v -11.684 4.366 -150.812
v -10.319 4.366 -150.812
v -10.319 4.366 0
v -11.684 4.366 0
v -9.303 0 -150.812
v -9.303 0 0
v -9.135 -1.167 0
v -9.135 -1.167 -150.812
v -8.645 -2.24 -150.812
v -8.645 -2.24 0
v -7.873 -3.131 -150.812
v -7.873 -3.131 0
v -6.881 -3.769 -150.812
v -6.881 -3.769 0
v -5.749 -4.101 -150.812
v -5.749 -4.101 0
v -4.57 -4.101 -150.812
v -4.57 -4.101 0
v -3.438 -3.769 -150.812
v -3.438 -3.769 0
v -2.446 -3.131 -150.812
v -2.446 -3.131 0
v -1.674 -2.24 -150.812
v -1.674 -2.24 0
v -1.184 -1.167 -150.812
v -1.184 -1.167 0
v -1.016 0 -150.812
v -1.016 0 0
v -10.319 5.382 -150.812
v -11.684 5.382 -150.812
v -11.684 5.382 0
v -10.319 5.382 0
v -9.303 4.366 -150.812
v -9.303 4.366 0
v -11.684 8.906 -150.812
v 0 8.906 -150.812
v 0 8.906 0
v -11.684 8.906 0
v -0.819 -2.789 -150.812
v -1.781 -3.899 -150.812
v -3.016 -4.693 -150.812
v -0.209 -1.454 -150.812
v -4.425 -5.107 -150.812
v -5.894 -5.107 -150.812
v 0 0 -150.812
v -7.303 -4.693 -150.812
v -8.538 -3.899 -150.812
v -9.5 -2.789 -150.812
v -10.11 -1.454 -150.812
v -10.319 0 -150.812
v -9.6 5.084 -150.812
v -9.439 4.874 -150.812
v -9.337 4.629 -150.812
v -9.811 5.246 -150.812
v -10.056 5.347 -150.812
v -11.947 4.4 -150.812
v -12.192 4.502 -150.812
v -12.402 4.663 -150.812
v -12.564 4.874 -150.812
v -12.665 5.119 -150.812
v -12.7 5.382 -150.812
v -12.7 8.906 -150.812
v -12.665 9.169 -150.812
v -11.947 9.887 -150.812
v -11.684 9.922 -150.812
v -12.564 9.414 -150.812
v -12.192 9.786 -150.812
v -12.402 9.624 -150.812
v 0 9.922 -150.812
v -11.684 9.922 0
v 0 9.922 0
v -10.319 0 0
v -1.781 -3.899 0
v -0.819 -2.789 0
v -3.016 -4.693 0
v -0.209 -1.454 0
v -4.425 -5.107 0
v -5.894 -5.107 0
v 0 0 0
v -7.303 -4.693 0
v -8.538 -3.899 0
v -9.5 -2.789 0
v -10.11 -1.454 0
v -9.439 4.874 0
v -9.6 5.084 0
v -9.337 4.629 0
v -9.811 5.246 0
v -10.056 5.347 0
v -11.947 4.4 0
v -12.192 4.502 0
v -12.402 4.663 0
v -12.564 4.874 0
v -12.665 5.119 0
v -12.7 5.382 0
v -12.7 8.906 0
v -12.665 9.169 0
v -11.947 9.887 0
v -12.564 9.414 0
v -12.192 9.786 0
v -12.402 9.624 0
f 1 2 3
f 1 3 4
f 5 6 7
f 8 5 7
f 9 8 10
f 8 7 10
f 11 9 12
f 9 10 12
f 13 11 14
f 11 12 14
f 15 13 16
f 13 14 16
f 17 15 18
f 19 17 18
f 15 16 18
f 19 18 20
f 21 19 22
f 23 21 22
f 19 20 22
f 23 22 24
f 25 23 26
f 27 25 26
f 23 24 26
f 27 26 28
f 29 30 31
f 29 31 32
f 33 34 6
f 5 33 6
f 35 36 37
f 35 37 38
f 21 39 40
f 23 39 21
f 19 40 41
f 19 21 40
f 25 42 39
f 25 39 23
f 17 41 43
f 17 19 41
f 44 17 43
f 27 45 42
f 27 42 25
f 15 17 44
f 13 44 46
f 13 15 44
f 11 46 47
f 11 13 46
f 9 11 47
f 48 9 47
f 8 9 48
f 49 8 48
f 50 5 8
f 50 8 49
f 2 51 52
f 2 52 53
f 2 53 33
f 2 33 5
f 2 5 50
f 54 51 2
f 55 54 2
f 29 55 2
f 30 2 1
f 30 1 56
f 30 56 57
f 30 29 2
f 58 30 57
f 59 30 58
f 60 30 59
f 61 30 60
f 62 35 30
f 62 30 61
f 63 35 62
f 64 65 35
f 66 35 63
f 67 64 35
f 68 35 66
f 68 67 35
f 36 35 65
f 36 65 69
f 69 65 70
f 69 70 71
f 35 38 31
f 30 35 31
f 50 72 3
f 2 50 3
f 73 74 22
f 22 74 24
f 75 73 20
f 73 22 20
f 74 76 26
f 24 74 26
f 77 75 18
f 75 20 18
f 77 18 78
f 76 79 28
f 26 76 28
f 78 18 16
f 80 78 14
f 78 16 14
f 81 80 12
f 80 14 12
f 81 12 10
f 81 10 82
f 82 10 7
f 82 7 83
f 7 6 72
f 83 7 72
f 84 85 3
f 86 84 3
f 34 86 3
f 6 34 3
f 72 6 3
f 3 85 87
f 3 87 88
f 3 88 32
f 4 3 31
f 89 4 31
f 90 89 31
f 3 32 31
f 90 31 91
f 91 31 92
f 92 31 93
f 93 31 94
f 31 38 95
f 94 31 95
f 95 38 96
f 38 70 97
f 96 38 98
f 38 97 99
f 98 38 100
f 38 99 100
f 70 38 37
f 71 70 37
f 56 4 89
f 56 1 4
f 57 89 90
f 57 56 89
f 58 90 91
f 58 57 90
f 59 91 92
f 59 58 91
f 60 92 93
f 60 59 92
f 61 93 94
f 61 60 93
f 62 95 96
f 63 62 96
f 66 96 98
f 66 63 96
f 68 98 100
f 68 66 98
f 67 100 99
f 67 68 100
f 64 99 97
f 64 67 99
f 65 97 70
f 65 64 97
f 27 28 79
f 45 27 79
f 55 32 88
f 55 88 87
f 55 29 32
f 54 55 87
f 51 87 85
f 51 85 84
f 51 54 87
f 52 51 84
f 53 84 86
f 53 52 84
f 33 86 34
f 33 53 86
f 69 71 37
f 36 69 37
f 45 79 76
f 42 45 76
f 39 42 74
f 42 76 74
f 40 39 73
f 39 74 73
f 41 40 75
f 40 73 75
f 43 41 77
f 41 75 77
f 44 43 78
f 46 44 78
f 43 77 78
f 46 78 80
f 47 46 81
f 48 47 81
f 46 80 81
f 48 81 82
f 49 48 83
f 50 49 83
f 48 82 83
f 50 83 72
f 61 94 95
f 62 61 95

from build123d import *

# Parameters (mm, degrees)
EXTRUDE_THIN1_DEPTH = 150.8125
FILLET1_R           = 1.016


with BuildPart() as part:
    # Sketch1 → Extrude-Thin1 (new body)
    with BuildSketch(Plane.XY):
        with BuildLine():
            ThreePointArc((0, 0), (-5.159375, -5.159375), (-10.31875, 0))
            Line((-10.31875, 0), (-10.31875, 4.365625))
            Line((-10.31875, 4.365625), (-12.7, 4.365625))
            Line((-12.7, 4.365625), (-12.7, 9.921875))
            Line((-12.7, 9.921875), (0, 9.921875))
            Line((0, 9.921875), (0, 8.905875))
            Line((0, 8.905875), (-11.684, 8.905875))
            Line((-11.684, 8.905875), (-11.684, 5.381625))
            Line((-11.684, 5.381625), (-9.30275, 5.381625))
            Line((-9.30275, 5.381625), (-9.30275, 0))
            ThreePointArc((-9.30275, 0), (-5.159375, -4.143375), (-1.016, 0))
            Line((-1.016, 0), (0, 0))
        make_face()
    extrude(amount=-EXTRUDE_THIN1_DEPTH)

    # Fillet1
    fillet1_edges = [part.edges().sort_by_distance(p)[0] for p in [
        (-9.30275, 5.381625, -75.40625),
        (-12.7, 4.365625, -75.40625),
        (-12.7, 9.921875, -75.40625),
    ]]
    fillet(fillet1_edges, radius=FILLET1_R)


solid = part.part
